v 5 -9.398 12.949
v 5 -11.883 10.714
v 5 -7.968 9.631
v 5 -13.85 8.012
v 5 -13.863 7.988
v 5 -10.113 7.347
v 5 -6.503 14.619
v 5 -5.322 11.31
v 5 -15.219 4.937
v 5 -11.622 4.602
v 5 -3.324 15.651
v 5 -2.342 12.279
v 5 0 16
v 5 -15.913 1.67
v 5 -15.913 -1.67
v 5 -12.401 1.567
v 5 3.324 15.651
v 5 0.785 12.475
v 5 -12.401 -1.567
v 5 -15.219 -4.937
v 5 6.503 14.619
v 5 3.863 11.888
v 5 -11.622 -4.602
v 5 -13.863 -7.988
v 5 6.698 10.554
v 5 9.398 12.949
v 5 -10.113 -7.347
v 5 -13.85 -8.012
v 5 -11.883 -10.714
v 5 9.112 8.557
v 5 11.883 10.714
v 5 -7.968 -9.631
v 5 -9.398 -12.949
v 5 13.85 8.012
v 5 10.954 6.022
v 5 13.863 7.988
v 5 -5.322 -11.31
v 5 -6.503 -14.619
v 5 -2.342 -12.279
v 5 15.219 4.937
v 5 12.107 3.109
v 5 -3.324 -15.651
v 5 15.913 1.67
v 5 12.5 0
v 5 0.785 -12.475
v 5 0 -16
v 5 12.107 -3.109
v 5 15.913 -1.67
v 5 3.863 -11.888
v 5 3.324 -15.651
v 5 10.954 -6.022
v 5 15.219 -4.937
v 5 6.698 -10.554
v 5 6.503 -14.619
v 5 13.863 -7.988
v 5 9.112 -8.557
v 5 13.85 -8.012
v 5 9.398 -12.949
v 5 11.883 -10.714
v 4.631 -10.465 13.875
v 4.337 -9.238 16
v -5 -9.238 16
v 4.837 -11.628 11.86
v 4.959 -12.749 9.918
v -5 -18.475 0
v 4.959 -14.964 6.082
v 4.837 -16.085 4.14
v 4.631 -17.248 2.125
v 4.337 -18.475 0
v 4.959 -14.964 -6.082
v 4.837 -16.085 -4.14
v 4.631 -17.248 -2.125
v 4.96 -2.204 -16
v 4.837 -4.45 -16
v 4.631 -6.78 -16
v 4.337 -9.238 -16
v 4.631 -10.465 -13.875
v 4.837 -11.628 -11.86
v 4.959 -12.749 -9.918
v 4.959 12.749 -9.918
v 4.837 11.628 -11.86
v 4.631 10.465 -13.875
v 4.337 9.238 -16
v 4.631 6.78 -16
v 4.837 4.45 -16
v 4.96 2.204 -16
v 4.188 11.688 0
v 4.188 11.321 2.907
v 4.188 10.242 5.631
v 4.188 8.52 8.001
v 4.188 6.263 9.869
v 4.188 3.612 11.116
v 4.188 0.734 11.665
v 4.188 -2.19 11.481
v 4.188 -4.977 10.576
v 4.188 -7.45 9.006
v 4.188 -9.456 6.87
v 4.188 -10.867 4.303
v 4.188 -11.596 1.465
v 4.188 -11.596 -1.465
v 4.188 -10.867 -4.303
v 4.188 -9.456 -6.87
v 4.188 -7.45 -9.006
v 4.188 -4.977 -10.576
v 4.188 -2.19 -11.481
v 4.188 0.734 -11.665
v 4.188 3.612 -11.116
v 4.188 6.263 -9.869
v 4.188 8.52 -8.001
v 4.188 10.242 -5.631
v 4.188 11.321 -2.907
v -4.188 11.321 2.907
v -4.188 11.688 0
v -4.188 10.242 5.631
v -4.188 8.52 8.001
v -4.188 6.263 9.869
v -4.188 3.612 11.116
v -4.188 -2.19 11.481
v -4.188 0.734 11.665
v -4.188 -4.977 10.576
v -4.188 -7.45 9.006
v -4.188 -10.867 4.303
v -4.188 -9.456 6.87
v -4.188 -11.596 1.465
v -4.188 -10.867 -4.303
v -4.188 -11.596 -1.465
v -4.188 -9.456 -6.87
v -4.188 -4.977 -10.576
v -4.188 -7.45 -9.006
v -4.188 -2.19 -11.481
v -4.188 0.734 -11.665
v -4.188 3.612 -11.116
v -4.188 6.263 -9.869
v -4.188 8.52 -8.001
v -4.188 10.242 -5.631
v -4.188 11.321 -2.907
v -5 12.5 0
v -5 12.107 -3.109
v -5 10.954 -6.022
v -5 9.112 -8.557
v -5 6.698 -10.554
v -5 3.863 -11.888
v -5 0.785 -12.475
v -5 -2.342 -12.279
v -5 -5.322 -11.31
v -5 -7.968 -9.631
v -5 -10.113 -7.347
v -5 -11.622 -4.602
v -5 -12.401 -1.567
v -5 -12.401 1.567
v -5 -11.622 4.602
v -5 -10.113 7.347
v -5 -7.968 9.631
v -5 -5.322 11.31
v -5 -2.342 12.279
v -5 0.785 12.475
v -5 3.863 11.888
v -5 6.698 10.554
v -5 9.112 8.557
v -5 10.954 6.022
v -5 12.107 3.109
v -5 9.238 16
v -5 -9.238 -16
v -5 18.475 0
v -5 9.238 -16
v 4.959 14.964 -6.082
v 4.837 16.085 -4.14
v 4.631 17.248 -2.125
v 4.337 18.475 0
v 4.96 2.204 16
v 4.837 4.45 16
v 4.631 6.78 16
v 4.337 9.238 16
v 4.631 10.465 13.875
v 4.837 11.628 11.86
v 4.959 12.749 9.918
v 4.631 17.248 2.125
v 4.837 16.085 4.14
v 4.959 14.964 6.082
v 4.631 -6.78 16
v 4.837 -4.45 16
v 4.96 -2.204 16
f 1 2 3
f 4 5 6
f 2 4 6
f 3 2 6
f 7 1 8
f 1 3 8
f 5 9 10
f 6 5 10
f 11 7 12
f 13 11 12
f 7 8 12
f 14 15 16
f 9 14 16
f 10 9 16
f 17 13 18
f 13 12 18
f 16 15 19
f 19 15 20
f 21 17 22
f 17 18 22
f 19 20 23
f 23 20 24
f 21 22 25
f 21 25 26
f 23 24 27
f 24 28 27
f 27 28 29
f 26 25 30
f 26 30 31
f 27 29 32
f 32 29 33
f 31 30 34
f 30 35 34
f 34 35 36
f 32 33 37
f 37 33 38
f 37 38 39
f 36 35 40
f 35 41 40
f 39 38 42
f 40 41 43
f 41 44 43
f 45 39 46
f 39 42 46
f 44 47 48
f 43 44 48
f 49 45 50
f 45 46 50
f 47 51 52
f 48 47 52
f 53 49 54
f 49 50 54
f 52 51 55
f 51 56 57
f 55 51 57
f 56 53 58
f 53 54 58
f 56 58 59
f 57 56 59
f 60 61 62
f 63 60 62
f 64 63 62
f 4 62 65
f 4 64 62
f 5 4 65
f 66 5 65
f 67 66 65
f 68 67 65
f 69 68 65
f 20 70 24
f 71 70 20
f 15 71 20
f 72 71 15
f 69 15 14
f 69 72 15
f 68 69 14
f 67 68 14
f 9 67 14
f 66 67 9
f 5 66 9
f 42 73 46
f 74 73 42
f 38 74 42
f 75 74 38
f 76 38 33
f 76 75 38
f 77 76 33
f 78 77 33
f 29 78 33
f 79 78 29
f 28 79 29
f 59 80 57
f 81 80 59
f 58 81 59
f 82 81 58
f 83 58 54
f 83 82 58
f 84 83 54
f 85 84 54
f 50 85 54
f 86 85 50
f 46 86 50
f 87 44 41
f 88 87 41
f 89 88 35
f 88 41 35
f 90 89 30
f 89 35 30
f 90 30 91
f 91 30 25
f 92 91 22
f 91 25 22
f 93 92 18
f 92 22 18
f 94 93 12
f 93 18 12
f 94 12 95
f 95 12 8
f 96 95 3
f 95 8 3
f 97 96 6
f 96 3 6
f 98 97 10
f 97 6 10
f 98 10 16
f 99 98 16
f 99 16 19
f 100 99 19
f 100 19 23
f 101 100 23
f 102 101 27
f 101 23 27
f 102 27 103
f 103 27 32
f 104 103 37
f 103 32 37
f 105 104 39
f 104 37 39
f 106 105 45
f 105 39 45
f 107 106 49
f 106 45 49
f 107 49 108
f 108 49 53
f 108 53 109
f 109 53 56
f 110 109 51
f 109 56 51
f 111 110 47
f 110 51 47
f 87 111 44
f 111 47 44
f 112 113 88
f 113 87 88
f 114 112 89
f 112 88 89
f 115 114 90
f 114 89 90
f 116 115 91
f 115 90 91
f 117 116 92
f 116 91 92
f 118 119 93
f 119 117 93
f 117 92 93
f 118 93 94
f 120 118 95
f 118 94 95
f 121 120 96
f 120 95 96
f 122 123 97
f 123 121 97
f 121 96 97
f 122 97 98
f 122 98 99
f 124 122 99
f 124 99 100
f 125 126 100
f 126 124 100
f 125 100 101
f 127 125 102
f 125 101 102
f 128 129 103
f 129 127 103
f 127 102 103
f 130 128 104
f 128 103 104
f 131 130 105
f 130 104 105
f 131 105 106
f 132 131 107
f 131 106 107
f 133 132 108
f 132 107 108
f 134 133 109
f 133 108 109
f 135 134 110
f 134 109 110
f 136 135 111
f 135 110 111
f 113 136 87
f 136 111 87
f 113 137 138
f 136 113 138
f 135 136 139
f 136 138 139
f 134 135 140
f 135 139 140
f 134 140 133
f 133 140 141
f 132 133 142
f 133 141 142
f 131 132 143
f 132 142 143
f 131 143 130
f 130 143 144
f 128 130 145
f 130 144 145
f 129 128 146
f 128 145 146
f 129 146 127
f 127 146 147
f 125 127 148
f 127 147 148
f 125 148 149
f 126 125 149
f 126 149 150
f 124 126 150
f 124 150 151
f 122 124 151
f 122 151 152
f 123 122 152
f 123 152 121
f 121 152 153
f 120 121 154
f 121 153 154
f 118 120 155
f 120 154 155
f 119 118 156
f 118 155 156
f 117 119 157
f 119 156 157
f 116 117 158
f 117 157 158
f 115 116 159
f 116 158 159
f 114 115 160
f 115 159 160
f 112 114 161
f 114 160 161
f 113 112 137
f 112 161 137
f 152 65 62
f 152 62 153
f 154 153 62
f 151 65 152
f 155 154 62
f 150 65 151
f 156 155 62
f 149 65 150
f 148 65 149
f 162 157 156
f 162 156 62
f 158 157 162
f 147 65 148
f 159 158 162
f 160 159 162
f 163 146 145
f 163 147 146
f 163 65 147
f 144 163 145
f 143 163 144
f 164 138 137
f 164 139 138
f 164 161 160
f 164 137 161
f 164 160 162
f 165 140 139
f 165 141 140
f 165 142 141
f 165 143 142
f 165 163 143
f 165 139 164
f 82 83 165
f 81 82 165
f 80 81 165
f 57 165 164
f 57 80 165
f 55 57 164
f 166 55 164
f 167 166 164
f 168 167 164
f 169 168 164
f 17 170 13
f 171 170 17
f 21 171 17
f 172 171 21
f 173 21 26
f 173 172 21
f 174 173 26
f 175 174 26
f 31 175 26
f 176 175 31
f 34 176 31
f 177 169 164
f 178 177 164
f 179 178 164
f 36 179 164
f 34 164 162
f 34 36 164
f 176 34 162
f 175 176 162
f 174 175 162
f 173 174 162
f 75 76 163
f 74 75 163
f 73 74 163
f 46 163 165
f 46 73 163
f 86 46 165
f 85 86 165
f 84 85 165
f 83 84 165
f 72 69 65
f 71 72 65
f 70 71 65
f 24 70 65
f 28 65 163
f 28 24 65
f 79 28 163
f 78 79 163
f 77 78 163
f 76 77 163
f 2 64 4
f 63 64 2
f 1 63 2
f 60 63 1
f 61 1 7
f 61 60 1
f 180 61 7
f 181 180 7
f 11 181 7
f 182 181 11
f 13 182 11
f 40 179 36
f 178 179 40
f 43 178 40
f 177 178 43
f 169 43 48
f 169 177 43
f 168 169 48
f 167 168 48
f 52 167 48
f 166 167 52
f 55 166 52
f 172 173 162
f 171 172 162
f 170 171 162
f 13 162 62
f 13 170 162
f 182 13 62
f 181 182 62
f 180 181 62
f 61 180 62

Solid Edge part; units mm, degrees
sketch "Sketch1" plane through (0, 0, 0) normal (0, 0, 1) x (1, 0, 0)
  line L0 (-5, 0) -> (-5, 19.2)
  line L1 (-5, 19.2) -> (4.1426, 19.2)
  line L2 (4.1426, 19.2) -> (5, 16)
  line L3 (5, 16) -> (5, 0)
  line L4 (5, 0) -> (-5, 0)
revolve "RevolvedProtrusion1" add sketch "Sketch1" angle 360 about axis through (5, 0, 0) along (-1, 0, 0)
sketch "Sketch2" plane through (0, 0, 0) normal (0, 0, 1) x (1, 0, 0)
  line L0 (-5, 0) -> (-5, 12.5)
  line L1 (-5, 12.5) -> (-4.188, 11.688)
  line L2 (-4.188, 11.688) -> (4.188, 11.688)
  line L3 (4.188, 11.688) -> (5, 12.5)
  line L4 (5, 12.5) -> (5, 0)
  line L5 (5, 0) -> (-5, 0)
revolve "RevolvedCutout1" cut sketch "Sketch2" angle 360 about axis through (5, 0, 0) along (-1, 0, 0)
cosmetic_thread "Thread1" size "M25 x 1.5"
sketch "Sketch3" plane through (0, 0, 0) normal (1, 0, 0) x (0, 1, 0)
  line L0 (-32, 32) -> (-32, -32)
  line L1 (-32, -32) -> (32, -32)
  line L2 (32, -32) -> (32, 32)
  line L3 (32, 32) -> (-32, 32)
  line L4 (9.2376, 16) -> (-9.2376, 16)
  line L5 (-9.2376, 16) -> (-18.4752, 0)
  line L6 (-18.4752, 0) -> (-9.2376, -16)
  line L7 (-9.2376, -16) -> (9.2376, -16)
  line L8 (9.2376, -16) -> (18.4752, 0)
  line L9 (18.4752, 0) -> (9.2376, 16)
extrude "ExtrudedCutout_1" cut sketch "Sketch3" against normal blind 10 and the other way blind 10
